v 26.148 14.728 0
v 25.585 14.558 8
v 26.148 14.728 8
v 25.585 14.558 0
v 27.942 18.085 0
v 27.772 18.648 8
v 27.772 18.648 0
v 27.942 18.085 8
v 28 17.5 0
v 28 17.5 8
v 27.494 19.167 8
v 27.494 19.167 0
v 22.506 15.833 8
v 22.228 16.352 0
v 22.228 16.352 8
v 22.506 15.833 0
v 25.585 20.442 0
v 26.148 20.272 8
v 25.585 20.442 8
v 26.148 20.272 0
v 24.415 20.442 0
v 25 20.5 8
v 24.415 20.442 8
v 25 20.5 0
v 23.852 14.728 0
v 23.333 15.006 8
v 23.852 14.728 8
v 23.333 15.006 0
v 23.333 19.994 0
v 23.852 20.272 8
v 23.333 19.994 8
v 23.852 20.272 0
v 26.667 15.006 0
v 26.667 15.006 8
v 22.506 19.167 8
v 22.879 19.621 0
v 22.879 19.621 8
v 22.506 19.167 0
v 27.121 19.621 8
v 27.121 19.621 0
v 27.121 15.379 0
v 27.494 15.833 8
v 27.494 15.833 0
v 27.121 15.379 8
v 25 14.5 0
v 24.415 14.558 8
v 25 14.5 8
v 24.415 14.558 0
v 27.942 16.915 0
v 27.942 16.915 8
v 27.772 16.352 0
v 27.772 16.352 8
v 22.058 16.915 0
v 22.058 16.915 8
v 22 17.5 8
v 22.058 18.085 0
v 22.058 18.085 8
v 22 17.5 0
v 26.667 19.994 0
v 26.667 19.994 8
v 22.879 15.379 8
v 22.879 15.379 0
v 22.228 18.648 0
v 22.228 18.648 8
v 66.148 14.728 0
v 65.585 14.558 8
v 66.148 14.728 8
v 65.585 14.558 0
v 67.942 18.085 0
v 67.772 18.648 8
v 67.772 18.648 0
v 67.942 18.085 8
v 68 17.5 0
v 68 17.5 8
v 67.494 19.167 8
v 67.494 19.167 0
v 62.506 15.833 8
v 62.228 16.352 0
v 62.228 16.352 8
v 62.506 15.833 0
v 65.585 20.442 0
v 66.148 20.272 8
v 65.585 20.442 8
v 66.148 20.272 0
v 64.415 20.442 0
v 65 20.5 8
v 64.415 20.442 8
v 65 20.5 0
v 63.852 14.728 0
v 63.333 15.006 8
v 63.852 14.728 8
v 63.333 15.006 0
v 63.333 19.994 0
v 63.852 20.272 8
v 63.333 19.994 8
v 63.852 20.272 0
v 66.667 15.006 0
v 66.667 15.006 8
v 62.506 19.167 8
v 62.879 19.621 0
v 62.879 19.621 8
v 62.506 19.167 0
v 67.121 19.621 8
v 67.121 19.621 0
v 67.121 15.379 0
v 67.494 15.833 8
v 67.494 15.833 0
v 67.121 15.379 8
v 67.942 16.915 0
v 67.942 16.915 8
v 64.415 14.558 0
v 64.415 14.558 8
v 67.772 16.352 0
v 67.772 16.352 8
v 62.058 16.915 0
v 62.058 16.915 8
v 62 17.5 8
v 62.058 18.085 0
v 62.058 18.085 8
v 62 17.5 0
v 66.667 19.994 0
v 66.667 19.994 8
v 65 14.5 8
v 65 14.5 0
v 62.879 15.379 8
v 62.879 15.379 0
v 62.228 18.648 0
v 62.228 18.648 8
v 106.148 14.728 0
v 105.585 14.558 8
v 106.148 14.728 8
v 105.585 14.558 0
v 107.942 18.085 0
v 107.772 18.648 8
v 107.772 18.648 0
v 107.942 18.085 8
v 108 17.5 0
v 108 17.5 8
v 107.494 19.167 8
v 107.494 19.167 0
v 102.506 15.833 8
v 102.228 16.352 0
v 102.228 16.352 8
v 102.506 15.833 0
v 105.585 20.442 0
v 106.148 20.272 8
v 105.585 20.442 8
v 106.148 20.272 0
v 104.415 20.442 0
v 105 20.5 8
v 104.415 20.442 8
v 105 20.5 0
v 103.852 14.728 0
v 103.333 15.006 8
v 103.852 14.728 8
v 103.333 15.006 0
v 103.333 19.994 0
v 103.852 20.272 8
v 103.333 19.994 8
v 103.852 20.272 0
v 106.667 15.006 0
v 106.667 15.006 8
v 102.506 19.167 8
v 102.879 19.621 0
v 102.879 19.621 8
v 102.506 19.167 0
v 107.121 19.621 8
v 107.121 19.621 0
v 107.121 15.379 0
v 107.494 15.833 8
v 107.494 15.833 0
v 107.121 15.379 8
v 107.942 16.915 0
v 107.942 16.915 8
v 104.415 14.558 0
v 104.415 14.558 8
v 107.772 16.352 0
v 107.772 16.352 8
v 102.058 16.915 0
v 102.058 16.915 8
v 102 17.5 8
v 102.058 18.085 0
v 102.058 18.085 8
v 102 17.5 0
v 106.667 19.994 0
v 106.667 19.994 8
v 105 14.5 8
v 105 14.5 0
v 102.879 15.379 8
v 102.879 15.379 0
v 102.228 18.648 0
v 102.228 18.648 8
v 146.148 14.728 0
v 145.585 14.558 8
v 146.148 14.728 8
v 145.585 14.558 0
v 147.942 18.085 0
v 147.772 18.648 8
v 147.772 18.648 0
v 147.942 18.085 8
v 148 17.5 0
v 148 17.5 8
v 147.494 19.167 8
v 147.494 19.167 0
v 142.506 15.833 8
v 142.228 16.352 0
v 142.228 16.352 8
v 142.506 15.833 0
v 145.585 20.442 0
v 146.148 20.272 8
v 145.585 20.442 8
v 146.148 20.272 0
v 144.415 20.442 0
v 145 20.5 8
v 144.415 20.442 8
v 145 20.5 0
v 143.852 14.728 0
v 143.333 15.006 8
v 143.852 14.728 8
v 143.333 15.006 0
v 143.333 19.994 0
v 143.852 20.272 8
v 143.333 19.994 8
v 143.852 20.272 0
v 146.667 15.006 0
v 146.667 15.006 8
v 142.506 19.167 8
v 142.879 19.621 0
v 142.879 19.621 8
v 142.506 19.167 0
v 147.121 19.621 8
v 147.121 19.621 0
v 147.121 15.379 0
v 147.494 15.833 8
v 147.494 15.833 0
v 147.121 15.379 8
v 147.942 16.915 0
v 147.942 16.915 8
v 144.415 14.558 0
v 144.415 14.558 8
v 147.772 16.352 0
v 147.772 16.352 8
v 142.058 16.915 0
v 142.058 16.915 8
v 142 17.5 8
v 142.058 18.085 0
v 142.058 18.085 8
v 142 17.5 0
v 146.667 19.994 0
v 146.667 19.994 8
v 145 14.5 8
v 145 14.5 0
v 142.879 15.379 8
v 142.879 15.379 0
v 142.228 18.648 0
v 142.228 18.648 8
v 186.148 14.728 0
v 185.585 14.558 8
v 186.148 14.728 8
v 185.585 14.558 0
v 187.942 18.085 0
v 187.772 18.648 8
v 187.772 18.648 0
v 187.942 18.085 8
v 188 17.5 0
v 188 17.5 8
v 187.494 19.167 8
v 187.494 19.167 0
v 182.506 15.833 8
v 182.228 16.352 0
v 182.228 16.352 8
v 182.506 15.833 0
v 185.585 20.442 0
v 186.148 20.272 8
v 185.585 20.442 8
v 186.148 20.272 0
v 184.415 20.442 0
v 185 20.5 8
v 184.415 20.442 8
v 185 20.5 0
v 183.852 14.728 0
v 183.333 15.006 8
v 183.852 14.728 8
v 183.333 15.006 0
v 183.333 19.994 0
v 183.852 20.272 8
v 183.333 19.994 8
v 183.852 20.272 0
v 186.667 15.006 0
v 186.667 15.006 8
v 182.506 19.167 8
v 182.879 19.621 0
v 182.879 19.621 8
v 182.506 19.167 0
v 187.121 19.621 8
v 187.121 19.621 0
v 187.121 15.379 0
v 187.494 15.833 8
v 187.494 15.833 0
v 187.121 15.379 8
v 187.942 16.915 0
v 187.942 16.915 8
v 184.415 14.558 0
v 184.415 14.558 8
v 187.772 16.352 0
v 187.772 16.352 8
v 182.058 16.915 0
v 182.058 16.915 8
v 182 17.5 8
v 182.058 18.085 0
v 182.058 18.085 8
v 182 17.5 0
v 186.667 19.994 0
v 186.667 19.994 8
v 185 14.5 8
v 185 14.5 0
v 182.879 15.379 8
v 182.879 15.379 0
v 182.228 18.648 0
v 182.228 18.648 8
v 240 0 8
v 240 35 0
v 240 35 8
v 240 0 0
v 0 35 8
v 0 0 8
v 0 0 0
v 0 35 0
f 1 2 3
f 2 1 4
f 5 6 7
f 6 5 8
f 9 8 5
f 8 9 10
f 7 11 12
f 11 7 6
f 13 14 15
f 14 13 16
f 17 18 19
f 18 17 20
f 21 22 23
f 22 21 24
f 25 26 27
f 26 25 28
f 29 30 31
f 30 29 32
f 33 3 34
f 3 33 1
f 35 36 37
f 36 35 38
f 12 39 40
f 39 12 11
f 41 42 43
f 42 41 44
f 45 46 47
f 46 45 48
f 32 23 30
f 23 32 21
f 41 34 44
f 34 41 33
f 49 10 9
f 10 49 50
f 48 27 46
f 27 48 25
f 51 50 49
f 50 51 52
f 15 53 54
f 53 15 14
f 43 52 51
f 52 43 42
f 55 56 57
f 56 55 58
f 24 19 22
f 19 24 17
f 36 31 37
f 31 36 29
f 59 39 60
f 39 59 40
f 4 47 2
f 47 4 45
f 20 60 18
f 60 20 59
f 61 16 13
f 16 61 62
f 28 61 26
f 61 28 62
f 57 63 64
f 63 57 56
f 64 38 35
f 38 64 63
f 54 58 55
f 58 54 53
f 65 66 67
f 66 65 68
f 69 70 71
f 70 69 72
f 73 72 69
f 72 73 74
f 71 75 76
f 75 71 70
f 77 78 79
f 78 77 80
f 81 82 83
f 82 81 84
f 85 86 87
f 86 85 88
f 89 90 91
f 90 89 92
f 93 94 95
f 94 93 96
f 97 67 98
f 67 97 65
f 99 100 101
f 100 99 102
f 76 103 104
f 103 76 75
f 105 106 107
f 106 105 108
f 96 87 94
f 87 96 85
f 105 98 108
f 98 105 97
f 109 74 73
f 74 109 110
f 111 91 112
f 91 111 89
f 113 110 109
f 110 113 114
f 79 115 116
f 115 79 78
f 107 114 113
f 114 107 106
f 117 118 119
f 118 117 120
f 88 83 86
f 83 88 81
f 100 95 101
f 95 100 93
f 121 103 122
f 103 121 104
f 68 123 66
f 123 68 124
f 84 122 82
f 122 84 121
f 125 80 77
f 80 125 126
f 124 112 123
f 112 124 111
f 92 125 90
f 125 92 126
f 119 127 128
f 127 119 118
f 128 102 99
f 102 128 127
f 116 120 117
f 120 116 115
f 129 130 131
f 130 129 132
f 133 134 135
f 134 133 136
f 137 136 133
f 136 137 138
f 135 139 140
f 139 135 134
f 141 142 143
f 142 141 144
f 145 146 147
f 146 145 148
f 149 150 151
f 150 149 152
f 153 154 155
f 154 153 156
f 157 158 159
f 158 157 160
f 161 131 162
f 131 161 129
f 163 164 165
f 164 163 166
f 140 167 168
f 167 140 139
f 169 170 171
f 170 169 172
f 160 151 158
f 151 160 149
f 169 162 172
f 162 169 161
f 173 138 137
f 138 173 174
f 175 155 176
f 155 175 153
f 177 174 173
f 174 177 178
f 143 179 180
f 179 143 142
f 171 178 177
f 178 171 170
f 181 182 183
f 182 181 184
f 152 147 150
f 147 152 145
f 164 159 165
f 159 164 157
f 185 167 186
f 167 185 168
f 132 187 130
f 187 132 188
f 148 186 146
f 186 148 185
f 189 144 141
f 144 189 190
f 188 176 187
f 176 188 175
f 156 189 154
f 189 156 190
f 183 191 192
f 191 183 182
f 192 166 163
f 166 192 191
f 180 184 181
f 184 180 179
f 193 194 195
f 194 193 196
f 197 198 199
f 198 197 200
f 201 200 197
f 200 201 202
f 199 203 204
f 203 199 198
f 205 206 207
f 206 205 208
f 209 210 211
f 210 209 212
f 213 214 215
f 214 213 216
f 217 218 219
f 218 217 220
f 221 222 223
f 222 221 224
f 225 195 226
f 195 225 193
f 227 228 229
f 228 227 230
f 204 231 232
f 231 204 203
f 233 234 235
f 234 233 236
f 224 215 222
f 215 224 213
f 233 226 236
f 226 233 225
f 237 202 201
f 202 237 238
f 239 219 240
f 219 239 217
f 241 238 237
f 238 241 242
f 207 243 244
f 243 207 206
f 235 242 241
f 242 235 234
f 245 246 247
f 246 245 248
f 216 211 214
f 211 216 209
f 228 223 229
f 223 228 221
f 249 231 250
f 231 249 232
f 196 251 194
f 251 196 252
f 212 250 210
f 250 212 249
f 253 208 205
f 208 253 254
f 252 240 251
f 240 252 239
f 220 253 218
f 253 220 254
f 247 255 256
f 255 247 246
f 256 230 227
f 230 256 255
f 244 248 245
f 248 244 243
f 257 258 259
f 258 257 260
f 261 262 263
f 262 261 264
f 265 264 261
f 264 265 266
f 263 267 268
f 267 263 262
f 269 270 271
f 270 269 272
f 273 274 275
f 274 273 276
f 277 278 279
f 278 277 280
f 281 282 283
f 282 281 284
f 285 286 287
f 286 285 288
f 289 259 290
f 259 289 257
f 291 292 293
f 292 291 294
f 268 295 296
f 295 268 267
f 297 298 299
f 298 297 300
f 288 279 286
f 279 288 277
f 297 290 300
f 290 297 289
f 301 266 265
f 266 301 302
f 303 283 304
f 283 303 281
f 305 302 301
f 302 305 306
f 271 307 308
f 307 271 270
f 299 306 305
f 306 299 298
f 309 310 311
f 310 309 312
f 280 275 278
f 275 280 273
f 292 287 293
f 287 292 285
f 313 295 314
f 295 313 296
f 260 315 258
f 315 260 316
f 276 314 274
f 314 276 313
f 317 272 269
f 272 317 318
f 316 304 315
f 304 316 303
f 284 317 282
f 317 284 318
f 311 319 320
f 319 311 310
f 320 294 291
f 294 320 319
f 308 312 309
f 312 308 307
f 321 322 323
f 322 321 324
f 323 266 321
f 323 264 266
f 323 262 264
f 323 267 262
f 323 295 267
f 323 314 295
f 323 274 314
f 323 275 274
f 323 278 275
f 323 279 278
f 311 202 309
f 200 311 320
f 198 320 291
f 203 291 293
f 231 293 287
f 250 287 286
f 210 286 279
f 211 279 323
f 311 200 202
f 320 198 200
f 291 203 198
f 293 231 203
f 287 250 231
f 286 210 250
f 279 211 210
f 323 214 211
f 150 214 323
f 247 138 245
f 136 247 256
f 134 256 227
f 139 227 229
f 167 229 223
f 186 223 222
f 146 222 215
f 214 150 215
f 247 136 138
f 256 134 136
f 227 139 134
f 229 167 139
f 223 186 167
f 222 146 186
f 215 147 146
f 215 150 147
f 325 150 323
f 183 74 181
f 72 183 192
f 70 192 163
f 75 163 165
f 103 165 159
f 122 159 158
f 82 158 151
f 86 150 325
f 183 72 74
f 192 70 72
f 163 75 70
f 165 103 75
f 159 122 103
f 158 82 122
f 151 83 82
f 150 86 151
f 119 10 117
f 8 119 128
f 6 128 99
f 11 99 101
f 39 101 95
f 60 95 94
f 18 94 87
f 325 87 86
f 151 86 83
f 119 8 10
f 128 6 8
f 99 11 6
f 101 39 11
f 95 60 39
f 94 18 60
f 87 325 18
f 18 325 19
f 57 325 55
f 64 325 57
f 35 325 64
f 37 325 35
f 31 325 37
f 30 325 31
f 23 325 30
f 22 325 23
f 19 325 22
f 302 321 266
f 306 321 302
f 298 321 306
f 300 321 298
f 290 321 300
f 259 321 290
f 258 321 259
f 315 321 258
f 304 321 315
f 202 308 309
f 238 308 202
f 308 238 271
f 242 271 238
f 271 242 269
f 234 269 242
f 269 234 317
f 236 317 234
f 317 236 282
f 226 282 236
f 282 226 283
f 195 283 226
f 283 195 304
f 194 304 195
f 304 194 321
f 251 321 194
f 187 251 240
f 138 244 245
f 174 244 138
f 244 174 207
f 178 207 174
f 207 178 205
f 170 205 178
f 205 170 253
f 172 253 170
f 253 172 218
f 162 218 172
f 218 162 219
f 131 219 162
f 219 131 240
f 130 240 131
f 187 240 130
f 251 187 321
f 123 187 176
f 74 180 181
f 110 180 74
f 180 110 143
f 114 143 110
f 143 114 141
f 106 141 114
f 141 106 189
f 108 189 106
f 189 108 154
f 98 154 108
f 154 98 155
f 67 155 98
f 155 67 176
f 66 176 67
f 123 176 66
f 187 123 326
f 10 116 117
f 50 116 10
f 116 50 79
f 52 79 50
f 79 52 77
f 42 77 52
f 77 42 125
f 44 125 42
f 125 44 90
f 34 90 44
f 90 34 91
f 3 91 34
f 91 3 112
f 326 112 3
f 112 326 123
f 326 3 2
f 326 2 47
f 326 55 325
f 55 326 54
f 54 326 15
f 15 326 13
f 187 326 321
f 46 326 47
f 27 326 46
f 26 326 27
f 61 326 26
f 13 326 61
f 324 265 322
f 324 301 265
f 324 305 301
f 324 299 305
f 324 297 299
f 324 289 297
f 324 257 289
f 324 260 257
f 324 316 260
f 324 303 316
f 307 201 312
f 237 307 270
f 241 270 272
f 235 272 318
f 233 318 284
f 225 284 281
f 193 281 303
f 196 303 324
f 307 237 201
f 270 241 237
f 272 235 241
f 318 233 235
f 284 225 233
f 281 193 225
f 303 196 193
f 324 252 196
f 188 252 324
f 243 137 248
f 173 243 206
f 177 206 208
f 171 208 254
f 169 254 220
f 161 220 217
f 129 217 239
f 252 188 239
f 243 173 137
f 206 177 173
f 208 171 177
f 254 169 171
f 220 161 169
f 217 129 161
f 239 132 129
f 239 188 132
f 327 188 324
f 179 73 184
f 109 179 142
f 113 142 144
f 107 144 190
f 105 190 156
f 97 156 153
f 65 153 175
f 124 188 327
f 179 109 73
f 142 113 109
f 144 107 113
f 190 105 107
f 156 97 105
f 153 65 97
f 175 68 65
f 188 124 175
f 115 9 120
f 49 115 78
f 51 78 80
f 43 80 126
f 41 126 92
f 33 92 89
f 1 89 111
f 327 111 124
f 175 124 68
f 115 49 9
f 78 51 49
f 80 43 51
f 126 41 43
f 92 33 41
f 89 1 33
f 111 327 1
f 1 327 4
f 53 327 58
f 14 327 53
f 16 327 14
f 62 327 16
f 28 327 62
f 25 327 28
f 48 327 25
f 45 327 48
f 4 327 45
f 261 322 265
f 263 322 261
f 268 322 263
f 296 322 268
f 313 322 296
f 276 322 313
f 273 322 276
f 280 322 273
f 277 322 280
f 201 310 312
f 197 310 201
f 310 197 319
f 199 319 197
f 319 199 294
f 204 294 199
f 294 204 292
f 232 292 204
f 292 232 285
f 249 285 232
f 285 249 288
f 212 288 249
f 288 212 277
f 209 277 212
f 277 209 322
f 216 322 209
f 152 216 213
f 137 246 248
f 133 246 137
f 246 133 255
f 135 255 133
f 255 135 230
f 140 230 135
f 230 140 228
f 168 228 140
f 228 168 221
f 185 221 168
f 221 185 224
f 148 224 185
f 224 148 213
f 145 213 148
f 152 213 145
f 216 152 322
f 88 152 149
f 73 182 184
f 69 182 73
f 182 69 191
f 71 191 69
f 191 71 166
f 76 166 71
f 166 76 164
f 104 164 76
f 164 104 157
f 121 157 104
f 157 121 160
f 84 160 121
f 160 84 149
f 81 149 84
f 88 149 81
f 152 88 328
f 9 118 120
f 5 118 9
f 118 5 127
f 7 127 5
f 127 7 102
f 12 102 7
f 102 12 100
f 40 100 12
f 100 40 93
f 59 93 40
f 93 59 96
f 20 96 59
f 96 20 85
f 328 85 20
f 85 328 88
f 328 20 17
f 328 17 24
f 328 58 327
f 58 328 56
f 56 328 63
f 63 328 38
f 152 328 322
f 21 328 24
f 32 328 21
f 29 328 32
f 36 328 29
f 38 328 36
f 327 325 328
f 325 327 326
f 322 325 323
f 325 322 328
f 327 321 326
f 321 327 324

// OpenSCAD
$fn = 32;

// ----------------------------------------------------------------------
// Long rail: 200-250 mm mounting rail
// ----------------------------------------------------------------------

// --- parameters (mm) ---
rail_l = 240;             // rail length, X
rail_w = 35;              // rail width, Y
rail_t = 8;               // rail thickness, Z
hole_d = 6;               // mounting hole diameter
hole_start = 25;          // first hole offset from the end
hole_pitch = 40;          // hole pitch
holes = 5;                // number of holes

difference() {
  cube([rail_l, rail_w, rail_t]);
  for (i = [0 : holes - 1])
    translate([hole_start + i * hole_pitch, rail_w / 2, -1])
      cylinder(h = rail_t + 2, d = hole_d);
}
